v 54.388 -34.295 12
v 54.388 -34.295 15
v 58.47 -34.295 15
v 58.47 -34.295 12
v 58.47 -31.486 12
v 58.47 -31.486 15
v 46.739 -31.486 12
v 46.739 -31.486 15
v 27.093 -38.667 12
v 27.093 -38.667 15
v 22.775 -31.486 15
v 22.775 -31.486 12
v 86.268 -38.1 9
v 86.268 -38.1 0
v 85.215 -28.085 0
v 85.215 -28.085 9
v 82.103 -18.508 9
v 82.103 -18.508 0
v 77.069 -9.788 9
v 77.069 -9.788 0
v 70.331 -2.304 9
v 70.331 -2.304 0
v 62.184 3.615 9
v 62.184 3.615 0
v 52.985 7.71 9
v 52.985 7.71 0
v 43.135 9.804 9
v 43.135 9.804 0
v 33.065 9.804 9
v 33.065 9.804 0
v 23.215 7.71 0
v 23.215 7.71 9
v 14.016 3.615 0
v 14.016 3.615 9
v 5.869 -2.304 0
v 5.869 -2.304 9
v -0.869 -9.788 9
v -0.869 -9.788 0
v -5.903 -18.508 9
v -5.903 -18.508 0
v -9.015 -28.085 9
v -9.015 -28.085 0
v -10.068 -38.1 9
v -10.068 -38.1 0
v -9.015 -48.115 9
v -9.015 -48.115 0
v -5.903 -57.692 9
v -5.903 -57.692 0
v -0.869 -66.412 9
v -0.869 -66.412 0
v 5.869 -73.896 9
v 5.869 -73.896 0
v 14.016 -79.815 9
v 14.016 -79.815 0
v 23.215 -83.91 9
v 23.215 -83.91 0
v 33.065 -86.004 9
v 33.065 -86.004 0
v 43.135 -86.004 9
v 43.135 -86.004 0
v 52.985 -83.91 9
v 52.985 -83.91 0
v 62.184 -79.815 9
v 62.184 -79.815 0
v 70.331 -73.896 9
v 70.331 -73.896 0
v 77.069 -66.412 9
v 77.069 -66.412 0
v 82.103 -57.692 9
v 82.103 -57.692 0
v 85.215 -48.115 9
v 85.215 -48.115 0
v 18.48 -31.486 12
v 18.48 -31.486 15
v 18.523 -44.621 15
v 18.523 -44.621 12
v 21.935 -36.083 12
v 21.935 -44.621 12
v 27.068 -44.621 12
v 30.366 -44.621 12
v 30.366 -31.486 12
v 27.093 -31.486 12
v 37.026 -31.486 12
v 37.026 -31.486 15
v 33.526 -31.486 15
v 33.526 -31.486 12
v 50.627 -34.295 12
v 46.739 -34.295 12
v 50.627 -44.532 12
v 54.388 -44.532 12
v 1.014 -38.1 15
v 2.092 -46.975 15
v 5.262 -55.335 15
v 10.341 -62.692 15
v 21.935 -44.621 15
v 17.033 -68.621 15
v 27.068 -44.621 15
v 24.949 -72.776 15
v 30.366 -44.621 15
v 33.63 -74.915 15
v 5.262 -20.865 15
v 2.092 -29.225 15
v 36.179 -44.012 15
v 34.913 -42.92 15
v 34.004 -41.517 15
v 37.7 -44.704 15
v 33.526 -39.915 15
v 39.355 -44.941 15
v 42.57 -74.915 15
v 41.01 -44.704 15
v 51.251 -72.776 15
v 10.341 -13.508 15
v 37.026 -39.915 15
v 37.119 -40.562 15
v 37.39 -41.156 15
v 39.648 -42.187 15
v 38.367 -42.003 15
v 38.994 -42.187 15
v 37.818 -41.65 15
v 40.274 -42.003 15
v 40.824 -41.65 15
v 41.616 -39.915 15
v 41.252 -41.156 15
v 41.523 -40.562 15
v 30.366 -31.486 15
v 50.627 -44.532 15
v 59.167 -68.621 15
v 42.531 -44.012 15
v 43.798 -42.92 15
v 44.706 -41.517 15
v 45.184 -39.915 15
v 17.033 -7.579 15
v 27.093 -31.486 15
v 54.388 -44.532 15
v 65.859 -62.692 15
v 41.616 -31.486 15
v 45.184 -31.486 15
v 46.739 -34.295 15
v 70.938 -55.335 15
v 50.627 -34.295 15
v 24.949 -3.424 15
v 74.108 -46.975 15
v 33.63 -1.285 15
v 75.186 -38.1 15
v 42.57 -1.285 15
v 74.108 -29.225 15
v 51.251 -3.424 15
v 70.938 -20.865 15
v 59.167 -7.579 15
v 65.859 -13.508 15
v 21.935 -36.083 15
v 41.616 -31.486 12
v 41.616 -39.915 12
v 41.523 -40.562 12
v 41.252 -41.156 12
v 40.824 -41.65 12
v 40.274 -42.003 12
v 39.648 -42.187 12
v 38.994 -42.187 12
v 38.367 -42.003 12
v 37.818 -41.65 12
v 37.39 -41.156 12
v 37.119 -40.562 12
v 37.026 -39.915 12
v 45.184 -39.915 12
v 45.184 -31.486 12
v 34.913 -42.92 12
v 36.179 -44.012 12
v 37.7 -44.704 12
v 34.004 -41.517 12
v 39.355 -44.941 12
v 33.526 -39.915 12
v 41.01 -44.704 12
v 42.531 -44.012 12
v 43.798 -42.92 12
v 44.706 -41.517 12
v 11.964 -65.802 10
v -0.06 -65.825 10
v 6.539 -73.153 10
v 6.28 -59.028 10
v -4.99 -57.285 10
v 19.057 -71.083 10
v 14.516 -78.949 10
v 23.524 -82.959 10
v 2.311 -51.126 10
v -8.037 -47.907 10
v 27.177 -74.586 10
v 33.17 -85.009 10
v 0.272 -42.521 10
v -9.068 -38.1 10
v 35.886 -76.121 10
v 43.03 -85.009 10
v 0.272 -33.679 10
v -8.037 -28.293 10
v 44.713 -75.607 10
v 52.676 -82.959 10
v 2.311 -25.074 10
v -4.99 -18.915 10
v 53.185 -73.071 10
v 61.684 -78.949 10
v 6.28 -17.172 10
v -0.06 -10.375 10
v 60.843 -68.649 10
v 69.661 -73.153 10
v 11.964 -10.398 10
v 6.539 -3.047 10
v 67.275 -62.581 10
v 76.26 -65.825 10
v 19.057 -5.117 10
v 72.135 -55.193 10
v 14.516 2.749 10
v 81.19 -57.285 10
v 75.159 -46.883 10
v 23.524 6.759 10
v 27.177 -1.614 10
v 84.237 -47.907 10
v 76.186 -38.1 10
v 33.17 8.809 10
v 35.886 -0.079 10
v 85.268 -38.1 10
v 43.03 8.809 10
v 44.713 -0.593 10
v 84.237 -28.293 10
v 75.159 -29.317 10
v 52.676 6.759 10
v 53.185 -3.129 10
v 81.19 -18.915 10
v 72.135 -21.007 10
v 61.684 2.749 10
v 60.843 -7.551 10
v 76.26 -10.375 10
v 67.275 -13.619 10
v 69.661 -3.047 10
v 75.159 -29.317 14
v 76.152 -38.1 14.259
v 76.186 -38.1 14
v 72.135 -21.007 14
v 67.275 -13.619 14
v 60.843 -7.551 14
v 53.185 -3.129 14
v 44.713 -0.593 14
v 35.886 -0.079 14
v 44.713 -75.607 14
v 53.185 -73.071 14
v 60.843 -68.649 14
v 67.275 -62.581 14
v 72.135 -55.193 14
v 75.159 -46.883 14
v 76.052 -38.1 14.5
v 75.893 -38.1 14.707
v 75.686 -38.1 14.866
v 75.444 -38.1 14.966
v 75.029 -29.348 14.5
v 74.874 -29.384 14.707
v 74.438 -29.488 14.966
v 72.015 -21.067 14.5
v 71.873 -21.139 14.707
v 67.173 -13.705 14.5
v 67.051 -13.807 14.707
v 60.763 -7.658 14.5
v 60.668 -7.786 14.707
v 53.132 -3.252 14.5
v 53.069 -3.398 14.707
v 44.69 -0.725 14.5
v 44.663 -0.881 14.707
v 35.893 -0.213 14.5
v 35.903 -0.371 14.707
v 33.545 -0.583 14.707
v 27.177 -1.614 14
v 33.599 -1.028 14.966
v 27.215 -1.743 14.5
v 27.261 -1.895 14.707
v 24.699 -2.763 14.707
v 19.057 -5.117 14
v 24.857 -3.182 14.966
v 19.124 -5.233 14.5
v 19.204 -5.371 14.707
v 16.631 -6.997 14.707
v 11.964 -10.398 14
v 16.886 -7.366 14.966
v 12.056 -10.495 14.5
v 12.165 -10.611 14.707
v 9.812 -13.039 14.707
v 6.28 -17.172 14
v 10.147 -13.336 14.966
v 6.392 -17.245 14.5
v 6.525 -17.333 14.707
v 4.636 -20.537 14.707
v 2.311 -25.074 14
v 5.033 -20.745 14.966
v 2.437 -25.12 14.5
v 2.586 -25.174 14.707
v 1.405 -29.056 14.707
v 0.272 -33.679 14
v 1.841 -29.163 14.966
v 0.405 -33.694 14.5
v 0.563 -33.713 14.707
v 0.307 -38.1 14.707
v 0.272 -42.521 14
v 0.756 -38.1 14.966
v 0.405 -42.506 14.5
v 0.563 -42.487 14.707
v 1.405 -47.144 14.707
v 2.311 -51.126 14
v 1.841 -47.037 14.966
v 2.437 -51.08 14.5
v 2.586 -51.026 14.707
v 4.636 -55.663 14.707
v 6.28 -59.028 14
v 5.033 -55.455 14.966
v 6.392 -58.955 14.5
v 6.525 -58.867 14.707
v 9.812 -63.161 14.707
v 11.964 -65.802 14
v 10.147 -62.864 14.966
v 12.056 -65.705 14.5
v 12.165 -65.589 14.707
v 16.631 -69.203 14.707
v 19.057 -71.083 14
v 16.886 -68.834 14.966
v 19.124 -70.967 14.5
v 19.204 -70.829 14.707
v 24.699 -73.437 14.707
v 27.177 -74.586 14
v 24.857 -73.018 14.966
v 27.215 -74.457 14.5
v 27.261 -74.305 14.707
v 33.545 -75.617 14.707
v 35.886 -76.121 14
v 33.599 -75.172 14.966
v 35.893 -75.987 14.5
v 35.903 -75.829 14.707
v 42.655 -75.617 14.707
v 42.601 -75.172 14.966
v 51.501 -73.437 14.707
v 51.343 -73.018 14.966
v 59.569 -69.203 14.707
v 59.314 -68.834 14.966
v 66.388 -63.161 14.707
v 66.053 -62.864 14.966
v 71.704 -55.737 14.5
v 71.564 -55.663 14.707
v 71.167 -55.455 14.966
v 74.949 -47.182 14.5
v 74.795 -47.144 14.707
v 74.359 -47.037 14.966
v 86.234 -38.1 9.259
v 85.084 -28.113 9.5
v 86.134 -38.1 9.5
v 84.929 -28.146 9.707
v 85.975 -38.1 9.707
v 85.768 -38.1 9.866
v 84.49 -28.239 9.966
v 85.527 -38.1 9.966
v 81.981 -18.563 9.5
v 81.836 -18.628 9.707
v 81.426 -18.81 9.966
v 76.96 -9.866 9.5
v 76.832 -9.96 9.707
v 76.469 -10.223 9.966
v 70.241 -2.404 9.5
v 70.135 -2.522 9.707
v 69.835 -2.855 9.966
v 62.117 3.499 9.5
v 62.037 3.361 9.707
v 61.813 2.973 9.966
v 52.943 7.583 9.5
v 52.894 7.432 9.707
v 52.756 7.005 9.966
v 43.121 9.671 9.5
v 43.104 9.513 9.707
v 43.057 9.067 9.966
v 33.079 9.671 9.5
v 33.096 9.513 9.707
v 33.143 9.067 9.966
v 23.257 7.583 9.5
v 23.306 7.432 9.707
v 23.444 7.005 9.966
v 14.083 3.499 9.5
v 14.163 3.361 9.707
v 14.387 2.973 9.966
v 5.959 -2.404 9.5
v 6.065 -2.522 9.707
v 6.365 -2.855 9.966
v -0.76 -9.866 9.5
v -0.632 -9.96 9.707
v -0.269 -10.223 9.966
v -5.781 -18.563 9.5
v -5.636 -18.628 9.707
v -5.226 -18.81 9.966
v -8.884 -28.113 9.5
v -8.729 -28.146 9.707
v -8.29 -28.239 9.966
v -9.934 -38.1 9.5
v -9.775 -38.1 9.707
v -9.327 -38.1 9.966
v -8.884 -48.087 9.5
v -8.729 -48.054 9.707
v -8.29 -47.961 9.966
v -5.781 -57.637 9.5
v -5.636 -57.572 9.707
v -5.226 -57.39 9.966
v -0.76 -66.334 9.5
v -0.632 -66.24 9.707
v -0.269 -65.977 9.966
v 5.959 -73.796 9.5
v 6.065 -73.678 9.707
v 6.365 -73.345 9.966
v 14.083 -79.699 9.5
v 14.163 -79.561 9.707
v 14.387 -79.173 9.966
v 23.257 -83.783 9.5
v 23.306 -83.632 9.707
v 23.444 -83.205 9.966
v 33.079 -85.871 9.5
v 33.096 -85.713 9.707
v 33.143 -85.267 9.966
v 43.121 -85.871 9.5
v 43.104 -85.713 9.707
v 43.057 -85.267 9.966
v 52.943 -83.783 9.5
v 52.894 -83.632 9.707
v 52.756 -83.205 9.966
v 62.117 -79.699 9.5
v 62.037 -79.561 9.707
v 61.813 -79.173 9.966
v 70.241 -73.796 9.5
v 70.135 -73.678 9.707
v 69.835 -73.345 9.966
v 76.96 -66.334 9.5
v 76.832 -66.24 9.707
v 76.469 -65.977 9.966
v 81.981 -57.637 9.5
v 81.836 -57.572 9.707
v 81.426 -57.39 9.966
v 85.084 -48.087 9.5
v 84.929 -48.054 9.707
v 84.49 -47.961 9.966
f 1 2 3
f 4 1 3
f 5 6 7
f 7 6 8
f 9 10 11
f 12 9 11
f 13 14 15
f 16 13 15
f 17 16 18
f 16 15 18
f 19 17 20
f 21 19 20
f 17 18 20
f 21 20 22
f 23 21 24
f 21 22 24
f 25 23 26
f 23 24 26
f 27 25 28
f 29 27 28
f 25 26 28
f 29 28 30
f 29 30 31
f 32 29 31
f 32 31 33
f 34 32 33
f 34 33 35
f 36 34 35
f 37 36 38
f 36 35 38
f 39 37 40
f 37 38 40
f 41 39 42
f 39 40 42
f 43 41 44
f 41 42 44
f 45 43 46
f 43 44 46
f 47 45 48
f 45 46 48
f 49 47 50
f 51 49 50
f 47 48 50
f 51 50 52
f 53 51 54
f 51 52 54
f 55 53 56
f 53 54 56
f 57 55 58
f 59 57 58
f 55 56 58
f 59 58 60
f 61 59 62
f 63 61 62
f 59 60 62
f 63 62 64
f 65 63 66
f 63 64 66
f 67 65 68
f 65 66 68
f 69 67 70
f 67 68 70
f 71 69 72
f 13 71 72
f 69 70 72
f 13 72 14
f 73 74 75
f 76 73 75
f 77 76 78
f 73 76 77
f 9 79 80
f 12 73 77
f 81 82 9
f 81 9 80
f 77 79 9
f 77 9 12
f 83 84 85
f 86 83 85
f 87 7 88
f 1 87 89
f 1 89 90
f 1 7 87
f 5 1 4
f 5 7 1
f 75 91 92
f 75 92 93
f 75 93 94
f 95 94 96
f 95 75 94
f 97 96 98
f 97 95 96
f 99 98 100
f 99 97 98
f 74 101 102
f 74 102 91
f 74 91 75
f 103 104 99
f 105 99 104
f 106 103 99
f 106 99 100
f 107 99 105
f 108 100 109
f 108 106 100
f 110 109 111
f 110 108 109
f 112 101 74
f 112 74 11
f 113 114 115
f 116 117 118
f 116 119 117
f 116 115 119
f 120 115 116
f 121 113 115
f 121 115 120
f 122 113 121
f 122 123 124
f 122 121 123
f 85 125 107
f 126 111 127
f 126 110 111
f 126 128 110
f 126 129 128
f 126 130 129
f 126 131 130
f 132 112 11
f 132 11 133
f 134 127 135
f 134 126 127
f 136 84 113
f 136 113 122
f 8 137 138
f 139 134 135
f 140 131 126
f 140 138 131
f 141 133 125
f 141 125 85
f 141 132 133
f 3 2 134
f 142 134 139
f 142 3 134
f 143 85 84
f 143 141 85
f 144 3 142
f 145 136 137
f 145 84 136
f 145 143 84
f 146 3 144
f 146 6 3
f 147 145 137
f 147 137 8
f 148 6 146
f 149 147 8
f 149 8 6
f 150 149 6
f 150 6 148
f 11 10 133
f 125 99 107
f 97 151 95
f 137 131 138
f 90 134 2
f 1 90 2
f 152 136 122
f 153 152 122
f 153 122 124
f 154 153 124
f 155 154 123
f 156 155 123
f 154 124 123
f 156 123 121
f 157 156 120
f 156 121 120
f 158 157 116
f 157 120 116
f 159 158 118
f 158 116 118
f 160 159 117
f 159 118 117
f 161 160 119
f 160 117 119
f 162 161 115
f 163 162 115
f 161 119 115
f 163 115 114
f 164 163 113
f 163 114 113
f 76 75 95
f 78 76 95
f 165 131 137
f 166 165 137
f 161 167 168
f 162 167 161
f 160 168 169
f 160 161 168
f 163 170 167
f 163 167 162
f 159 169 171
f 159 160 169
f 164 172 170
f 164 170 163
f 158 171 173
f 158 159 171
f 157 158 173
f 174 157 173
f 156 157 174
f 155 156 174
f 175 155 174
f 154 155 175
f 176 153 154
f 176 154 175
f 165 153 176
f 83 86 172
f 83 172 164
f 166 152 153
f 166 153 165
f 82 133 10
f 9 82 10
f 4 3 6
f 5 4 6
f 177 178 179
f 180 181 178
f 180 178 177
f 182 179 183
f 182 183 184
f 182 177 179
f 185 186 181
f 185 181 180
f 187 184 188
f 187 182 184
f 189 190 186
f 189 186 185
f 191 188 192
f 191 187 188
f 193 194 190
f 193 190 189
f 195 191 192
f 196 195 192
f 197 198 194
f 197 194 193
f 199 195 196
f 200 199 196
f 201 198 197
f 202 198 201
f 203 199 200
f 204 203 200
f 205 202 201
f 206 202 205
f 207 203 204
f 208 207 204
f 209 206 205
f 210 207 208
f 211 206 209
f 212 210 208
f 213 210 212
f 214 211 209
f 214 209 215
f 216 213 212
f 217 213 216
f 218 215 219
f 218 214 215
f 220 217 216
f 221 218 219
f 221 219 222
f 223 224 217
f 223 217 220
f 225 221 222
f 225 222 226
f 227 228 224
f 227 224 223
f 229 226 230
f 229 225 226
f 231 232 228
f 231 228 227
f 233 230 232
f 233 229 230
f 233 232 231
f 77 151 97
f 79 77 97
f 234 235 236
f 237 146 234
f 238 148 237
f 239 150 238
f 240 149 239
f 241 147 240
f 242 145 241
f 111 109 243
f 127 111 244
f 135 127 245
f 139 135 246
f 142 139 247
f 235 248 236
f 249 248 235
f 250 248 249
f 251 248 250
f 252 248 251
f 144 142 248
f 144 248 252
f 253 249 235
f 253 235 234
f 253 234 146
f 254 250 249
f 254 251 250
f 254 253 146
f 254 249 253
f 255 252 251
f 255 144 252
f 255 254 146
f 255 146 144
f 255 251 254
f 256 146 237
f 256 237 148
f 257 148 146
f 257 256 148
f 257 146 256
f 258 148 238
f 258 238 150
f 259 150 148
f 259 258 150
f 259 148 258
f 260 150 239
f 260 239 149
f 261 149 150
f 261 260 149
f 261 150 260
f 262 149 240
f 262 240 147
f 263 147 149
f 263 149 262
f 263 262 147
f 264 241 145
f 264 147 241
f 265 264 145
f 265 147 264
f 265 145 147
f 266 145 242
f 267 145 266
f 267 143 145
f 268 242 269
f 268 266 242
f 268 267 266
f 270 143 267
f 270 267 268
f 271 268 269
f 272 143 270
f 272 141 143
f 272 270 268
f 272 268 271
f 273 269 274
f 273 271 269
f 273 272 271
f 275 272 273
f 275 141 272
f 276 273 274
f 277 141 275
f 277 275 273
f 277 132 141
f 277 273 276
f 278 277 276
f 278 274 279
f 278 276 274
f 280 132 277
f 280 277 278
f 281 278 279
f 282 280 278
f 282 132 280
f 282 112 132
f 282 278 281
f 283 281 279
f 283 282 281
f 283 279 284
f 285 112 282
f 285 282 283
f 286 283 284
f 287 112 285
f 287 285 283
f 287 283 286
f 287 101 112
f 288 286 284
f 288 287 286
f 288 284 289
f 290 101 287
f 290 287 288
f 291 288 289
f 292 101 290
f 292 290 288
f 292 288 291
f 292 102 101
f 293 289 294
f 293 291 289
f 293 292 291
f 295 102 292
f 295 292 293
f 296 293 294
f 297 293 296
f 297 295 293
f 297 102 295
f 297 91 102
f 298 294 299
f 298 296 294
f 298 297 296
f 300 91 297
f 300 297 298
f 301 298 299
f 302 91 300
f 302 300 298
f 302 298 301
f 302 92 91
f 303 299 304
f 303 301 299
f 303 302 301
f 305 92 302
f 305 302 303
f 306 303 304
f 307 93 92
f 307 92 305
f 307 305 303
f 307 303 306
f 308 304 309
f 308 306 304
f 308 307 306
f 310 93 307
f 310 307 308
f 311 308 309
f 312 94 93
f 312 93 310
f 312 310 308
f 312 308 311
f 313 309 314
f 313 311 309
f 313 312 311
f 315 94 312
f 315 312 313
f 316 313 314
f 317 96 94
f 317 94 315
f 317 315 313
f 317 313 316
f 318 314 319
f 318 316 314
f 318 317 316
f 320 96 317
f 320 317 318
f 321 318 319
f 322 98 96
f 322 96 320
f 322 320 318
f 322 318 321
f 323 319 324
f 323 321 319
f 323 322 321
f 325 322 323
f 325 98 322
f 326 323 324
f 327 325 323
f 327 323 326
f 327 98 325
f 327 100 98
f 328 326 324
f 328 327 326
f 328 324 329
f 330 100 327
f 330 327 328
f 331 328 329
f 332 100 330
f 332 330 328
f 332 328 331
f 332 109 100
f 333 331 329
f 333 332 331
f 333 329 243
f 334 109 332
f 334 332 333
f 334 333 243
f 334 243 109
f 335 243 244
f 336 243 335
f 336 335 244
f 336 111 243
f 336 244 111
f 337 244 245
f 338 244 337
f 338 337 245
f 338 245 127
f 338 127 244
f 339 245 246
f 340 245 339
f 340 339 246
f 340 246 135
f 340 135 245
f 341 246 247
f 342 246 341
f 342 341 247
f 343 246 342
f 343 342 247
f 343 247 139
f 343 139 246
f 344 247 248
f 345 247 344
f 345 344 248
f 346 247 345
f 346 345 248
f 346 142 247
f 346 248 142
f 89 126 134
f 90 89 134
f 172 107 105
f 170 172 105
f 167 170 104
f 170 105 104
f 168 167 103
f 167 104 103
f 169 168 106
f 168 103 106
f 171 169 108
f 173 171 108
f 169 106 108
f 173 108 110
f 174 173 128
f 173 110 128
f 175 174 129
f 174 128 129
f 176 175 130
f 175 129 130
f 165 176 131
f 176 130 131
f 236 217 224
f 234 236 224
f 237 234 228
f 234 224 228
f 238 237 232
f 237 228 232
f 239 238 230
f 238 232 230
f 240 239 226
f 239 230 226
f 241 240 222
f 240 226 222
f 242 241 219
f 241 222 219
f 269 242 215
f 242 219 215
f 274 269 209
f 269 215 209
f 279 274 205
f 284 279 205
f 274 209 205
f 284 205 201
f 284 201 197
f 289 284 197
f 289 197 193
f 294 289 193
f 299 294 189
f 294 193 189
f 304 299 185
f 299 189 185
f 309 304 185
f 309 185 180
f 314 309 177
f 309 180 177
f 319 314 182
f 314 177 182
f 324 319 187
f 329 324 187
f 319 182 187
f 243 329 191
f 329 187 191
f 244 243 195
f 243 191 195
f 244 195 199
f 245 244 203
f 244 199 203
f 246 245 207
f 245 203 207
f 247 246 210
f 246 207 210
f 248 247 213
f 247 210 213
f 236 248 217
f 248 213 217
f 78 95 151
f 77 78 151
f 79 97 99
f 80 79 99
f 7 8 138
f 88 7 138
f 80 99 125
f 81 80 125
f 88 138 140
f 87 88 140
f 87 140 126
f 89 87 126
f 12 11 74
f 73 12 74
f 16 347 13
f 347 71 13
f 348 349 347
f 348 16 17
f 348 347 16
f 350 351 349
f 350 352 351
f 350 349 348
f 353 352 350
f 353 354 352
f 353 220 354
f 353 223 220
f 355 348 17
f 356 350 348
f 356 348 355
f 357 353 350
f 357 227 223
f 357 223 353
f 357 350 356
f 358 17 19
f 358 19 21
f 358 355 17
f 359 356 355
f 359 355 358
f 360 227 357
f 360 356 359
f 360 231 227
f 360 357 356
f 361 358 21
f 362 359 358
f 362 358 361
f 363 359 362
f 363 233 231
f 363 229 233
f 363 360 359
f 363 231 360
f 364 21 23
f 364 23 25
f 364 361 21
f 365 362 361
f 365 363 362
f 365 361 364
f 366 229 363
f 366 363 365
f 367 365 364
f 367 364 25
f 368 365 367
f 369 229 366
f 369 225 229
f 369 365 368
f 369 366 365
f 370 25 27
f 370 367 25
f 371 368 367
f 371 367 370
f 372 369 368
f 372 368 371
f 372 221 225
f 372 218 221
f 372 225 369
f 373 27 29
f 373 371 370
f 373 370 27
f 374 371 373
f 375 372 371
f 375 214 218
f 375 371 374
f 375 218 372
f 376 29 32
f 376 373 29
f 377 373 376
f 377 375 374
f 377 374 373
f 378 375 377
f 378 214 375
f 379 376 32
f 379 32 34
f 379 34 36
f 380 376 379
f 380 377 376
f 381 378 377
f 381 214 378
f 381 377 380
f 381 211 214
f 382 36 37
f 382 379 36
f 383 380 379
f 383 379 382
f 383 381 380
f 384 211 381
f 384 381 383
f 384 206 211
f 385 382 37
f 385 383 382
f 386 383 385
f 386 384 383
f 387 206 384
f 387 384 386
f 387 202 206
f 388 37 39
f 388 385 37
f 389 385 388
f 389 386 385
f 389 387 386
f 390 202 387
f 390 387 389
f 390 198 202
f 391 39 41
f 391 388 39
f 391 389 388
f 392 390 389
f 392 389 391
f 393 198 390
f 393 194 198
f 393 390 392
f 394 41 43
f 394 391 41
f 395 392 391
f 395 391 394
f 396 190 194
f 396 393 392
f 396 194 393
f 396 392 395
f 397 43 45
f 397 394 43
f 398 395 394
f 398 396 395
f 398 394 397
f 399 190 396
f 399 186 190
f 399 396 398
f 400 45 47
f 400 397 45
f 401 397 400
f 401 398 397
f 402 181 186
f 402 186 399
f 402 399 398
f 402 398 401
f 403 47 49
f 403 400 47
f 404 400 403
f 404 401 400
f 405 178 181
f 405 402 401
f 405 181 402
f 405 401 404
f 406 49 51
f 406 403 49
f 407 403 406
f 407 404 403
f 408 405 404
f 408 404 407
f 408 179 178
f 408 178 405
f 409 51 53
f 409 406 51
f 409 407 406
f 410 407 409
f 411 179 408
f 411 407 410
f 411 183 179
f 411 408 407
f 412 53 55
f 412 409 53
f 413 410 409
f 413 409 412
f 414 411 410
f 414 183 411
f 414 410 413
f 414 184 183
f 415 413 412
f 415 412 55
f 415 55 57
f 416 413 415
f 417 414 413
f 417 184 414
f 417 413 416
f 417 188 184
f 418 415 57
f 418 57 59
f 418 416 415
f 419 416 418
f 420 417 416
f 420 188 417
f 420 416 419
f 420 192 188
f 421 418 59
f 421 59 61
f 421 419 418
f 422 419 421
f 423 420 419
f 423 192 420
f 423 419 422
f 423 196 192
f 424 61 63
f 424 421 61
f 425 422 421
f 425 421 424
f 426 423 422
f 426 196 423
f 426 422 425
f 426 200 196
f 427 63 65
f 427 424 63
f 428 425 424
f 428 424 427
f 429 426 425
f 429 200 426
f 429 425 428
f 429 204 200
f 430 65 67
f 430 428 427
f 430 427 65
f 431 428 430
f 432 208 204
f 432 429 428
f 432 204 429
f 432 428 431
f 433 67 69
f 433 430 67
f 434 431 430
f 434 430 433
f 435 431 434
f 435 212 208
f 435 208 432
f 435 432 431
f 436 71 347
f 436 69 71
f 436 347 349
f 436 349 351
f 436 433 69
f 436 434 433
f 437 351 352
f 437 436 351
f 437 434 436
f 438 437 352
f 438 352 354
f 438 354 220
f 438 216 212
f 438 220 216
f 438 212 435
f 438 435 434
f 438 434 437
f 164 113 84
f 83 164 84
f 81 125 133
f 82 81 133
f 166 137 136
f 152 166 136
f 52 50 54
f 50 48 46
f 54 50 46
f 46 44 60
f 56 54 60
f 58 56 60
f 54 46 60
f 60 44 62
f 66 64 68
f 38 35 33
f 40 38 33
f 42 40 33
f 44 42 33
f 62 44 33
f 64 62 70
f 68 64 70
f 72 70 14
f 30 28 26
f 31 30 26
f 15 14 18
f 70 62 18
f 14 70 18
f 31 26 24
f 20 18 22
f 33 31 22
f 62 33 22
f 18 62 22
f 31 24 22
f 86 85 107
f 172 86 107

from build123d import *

# Parameters (mm, degrees)
F0_R     = 48.167809
F1_DEPTH = 10
F2_R     = 38.085583
F3_DEPTH = 5
F5_DEPTH = 3
F6_R     = 1


with BuildPart() as f1:
    # F0 (on Top) → F1 (new body)
    with BuildSketch(Plane.XY):
        with Locations((38.1, -38.1)):
            Circle(F0_R)
    extrude(amount=F1_DEPTH)

    # F2 (on face) → F3 (join)
    with BuildSketch(Plane.XY.offset(10)):
        with Locations((38.1, -38.1)):
            Circle(F2_R)
    extrude(amount=F3_DEPTH)

    # F4 (on face) → F5 (cut)
    with BuildSketch(Plane.XY.offset(15)):
        Polygon((22.775168, -31.485546), (18.479863, -31.485546), (18.522732, -44.620931), (21.934504, -44.620931), (21.934504, -36.083298), (27.067889, -44.620931), (30.365812, -44.620931), (30.365812, -31.485546), (27.093198, -31.485546), (27.093198, -38.667116), align=None)
        with BuildLine():
            Line((37.025582, -31.485546), (33.525705, -31.485546))
            Line((33.525705, -31.485546), (33.525705, -39.915241))
            ThreePointArc((33.525705, -39.915241), (39.355047, -44.941114), (45.184389, -39.915241))
            Line((45.184389, -39.915241), (45.184389, -31.485546))
            Line((45.184389, -31.485546), (41.616332, -31.485546))
            Line((41.616332, -31.485546), (41.616332, -39.915241))
            ThreePointArc((41.616332, -39.915241), (39.320957, -42.210616), (37.025582, -39.915241))
            Line((37.025582, -39.915241), (37.025582, -31.485546))
        make_face()
        Polygon((58.469679, -31.485546), (46.738543, -31.485546), (46.738543, -34.295145), (50.627492, -34.295145), (50.627492, -44.531766), (54.387886, -44.531766), (54.387886, -34.295145), (58.469679, -34.295145), align=None)
    extrude(amount=-F5_DEPTH, mode=Mode.SUBTRACT)

    # F6
    f6_edges = [f1.edges().sort_by_distance(p)[0] for p in [
        (-10.067809, -38.1, 10),
        (0.014417, -38.1, 15),
    ]]
    fillet(f6_edges, radius=F6_R)


solid = f1.part
